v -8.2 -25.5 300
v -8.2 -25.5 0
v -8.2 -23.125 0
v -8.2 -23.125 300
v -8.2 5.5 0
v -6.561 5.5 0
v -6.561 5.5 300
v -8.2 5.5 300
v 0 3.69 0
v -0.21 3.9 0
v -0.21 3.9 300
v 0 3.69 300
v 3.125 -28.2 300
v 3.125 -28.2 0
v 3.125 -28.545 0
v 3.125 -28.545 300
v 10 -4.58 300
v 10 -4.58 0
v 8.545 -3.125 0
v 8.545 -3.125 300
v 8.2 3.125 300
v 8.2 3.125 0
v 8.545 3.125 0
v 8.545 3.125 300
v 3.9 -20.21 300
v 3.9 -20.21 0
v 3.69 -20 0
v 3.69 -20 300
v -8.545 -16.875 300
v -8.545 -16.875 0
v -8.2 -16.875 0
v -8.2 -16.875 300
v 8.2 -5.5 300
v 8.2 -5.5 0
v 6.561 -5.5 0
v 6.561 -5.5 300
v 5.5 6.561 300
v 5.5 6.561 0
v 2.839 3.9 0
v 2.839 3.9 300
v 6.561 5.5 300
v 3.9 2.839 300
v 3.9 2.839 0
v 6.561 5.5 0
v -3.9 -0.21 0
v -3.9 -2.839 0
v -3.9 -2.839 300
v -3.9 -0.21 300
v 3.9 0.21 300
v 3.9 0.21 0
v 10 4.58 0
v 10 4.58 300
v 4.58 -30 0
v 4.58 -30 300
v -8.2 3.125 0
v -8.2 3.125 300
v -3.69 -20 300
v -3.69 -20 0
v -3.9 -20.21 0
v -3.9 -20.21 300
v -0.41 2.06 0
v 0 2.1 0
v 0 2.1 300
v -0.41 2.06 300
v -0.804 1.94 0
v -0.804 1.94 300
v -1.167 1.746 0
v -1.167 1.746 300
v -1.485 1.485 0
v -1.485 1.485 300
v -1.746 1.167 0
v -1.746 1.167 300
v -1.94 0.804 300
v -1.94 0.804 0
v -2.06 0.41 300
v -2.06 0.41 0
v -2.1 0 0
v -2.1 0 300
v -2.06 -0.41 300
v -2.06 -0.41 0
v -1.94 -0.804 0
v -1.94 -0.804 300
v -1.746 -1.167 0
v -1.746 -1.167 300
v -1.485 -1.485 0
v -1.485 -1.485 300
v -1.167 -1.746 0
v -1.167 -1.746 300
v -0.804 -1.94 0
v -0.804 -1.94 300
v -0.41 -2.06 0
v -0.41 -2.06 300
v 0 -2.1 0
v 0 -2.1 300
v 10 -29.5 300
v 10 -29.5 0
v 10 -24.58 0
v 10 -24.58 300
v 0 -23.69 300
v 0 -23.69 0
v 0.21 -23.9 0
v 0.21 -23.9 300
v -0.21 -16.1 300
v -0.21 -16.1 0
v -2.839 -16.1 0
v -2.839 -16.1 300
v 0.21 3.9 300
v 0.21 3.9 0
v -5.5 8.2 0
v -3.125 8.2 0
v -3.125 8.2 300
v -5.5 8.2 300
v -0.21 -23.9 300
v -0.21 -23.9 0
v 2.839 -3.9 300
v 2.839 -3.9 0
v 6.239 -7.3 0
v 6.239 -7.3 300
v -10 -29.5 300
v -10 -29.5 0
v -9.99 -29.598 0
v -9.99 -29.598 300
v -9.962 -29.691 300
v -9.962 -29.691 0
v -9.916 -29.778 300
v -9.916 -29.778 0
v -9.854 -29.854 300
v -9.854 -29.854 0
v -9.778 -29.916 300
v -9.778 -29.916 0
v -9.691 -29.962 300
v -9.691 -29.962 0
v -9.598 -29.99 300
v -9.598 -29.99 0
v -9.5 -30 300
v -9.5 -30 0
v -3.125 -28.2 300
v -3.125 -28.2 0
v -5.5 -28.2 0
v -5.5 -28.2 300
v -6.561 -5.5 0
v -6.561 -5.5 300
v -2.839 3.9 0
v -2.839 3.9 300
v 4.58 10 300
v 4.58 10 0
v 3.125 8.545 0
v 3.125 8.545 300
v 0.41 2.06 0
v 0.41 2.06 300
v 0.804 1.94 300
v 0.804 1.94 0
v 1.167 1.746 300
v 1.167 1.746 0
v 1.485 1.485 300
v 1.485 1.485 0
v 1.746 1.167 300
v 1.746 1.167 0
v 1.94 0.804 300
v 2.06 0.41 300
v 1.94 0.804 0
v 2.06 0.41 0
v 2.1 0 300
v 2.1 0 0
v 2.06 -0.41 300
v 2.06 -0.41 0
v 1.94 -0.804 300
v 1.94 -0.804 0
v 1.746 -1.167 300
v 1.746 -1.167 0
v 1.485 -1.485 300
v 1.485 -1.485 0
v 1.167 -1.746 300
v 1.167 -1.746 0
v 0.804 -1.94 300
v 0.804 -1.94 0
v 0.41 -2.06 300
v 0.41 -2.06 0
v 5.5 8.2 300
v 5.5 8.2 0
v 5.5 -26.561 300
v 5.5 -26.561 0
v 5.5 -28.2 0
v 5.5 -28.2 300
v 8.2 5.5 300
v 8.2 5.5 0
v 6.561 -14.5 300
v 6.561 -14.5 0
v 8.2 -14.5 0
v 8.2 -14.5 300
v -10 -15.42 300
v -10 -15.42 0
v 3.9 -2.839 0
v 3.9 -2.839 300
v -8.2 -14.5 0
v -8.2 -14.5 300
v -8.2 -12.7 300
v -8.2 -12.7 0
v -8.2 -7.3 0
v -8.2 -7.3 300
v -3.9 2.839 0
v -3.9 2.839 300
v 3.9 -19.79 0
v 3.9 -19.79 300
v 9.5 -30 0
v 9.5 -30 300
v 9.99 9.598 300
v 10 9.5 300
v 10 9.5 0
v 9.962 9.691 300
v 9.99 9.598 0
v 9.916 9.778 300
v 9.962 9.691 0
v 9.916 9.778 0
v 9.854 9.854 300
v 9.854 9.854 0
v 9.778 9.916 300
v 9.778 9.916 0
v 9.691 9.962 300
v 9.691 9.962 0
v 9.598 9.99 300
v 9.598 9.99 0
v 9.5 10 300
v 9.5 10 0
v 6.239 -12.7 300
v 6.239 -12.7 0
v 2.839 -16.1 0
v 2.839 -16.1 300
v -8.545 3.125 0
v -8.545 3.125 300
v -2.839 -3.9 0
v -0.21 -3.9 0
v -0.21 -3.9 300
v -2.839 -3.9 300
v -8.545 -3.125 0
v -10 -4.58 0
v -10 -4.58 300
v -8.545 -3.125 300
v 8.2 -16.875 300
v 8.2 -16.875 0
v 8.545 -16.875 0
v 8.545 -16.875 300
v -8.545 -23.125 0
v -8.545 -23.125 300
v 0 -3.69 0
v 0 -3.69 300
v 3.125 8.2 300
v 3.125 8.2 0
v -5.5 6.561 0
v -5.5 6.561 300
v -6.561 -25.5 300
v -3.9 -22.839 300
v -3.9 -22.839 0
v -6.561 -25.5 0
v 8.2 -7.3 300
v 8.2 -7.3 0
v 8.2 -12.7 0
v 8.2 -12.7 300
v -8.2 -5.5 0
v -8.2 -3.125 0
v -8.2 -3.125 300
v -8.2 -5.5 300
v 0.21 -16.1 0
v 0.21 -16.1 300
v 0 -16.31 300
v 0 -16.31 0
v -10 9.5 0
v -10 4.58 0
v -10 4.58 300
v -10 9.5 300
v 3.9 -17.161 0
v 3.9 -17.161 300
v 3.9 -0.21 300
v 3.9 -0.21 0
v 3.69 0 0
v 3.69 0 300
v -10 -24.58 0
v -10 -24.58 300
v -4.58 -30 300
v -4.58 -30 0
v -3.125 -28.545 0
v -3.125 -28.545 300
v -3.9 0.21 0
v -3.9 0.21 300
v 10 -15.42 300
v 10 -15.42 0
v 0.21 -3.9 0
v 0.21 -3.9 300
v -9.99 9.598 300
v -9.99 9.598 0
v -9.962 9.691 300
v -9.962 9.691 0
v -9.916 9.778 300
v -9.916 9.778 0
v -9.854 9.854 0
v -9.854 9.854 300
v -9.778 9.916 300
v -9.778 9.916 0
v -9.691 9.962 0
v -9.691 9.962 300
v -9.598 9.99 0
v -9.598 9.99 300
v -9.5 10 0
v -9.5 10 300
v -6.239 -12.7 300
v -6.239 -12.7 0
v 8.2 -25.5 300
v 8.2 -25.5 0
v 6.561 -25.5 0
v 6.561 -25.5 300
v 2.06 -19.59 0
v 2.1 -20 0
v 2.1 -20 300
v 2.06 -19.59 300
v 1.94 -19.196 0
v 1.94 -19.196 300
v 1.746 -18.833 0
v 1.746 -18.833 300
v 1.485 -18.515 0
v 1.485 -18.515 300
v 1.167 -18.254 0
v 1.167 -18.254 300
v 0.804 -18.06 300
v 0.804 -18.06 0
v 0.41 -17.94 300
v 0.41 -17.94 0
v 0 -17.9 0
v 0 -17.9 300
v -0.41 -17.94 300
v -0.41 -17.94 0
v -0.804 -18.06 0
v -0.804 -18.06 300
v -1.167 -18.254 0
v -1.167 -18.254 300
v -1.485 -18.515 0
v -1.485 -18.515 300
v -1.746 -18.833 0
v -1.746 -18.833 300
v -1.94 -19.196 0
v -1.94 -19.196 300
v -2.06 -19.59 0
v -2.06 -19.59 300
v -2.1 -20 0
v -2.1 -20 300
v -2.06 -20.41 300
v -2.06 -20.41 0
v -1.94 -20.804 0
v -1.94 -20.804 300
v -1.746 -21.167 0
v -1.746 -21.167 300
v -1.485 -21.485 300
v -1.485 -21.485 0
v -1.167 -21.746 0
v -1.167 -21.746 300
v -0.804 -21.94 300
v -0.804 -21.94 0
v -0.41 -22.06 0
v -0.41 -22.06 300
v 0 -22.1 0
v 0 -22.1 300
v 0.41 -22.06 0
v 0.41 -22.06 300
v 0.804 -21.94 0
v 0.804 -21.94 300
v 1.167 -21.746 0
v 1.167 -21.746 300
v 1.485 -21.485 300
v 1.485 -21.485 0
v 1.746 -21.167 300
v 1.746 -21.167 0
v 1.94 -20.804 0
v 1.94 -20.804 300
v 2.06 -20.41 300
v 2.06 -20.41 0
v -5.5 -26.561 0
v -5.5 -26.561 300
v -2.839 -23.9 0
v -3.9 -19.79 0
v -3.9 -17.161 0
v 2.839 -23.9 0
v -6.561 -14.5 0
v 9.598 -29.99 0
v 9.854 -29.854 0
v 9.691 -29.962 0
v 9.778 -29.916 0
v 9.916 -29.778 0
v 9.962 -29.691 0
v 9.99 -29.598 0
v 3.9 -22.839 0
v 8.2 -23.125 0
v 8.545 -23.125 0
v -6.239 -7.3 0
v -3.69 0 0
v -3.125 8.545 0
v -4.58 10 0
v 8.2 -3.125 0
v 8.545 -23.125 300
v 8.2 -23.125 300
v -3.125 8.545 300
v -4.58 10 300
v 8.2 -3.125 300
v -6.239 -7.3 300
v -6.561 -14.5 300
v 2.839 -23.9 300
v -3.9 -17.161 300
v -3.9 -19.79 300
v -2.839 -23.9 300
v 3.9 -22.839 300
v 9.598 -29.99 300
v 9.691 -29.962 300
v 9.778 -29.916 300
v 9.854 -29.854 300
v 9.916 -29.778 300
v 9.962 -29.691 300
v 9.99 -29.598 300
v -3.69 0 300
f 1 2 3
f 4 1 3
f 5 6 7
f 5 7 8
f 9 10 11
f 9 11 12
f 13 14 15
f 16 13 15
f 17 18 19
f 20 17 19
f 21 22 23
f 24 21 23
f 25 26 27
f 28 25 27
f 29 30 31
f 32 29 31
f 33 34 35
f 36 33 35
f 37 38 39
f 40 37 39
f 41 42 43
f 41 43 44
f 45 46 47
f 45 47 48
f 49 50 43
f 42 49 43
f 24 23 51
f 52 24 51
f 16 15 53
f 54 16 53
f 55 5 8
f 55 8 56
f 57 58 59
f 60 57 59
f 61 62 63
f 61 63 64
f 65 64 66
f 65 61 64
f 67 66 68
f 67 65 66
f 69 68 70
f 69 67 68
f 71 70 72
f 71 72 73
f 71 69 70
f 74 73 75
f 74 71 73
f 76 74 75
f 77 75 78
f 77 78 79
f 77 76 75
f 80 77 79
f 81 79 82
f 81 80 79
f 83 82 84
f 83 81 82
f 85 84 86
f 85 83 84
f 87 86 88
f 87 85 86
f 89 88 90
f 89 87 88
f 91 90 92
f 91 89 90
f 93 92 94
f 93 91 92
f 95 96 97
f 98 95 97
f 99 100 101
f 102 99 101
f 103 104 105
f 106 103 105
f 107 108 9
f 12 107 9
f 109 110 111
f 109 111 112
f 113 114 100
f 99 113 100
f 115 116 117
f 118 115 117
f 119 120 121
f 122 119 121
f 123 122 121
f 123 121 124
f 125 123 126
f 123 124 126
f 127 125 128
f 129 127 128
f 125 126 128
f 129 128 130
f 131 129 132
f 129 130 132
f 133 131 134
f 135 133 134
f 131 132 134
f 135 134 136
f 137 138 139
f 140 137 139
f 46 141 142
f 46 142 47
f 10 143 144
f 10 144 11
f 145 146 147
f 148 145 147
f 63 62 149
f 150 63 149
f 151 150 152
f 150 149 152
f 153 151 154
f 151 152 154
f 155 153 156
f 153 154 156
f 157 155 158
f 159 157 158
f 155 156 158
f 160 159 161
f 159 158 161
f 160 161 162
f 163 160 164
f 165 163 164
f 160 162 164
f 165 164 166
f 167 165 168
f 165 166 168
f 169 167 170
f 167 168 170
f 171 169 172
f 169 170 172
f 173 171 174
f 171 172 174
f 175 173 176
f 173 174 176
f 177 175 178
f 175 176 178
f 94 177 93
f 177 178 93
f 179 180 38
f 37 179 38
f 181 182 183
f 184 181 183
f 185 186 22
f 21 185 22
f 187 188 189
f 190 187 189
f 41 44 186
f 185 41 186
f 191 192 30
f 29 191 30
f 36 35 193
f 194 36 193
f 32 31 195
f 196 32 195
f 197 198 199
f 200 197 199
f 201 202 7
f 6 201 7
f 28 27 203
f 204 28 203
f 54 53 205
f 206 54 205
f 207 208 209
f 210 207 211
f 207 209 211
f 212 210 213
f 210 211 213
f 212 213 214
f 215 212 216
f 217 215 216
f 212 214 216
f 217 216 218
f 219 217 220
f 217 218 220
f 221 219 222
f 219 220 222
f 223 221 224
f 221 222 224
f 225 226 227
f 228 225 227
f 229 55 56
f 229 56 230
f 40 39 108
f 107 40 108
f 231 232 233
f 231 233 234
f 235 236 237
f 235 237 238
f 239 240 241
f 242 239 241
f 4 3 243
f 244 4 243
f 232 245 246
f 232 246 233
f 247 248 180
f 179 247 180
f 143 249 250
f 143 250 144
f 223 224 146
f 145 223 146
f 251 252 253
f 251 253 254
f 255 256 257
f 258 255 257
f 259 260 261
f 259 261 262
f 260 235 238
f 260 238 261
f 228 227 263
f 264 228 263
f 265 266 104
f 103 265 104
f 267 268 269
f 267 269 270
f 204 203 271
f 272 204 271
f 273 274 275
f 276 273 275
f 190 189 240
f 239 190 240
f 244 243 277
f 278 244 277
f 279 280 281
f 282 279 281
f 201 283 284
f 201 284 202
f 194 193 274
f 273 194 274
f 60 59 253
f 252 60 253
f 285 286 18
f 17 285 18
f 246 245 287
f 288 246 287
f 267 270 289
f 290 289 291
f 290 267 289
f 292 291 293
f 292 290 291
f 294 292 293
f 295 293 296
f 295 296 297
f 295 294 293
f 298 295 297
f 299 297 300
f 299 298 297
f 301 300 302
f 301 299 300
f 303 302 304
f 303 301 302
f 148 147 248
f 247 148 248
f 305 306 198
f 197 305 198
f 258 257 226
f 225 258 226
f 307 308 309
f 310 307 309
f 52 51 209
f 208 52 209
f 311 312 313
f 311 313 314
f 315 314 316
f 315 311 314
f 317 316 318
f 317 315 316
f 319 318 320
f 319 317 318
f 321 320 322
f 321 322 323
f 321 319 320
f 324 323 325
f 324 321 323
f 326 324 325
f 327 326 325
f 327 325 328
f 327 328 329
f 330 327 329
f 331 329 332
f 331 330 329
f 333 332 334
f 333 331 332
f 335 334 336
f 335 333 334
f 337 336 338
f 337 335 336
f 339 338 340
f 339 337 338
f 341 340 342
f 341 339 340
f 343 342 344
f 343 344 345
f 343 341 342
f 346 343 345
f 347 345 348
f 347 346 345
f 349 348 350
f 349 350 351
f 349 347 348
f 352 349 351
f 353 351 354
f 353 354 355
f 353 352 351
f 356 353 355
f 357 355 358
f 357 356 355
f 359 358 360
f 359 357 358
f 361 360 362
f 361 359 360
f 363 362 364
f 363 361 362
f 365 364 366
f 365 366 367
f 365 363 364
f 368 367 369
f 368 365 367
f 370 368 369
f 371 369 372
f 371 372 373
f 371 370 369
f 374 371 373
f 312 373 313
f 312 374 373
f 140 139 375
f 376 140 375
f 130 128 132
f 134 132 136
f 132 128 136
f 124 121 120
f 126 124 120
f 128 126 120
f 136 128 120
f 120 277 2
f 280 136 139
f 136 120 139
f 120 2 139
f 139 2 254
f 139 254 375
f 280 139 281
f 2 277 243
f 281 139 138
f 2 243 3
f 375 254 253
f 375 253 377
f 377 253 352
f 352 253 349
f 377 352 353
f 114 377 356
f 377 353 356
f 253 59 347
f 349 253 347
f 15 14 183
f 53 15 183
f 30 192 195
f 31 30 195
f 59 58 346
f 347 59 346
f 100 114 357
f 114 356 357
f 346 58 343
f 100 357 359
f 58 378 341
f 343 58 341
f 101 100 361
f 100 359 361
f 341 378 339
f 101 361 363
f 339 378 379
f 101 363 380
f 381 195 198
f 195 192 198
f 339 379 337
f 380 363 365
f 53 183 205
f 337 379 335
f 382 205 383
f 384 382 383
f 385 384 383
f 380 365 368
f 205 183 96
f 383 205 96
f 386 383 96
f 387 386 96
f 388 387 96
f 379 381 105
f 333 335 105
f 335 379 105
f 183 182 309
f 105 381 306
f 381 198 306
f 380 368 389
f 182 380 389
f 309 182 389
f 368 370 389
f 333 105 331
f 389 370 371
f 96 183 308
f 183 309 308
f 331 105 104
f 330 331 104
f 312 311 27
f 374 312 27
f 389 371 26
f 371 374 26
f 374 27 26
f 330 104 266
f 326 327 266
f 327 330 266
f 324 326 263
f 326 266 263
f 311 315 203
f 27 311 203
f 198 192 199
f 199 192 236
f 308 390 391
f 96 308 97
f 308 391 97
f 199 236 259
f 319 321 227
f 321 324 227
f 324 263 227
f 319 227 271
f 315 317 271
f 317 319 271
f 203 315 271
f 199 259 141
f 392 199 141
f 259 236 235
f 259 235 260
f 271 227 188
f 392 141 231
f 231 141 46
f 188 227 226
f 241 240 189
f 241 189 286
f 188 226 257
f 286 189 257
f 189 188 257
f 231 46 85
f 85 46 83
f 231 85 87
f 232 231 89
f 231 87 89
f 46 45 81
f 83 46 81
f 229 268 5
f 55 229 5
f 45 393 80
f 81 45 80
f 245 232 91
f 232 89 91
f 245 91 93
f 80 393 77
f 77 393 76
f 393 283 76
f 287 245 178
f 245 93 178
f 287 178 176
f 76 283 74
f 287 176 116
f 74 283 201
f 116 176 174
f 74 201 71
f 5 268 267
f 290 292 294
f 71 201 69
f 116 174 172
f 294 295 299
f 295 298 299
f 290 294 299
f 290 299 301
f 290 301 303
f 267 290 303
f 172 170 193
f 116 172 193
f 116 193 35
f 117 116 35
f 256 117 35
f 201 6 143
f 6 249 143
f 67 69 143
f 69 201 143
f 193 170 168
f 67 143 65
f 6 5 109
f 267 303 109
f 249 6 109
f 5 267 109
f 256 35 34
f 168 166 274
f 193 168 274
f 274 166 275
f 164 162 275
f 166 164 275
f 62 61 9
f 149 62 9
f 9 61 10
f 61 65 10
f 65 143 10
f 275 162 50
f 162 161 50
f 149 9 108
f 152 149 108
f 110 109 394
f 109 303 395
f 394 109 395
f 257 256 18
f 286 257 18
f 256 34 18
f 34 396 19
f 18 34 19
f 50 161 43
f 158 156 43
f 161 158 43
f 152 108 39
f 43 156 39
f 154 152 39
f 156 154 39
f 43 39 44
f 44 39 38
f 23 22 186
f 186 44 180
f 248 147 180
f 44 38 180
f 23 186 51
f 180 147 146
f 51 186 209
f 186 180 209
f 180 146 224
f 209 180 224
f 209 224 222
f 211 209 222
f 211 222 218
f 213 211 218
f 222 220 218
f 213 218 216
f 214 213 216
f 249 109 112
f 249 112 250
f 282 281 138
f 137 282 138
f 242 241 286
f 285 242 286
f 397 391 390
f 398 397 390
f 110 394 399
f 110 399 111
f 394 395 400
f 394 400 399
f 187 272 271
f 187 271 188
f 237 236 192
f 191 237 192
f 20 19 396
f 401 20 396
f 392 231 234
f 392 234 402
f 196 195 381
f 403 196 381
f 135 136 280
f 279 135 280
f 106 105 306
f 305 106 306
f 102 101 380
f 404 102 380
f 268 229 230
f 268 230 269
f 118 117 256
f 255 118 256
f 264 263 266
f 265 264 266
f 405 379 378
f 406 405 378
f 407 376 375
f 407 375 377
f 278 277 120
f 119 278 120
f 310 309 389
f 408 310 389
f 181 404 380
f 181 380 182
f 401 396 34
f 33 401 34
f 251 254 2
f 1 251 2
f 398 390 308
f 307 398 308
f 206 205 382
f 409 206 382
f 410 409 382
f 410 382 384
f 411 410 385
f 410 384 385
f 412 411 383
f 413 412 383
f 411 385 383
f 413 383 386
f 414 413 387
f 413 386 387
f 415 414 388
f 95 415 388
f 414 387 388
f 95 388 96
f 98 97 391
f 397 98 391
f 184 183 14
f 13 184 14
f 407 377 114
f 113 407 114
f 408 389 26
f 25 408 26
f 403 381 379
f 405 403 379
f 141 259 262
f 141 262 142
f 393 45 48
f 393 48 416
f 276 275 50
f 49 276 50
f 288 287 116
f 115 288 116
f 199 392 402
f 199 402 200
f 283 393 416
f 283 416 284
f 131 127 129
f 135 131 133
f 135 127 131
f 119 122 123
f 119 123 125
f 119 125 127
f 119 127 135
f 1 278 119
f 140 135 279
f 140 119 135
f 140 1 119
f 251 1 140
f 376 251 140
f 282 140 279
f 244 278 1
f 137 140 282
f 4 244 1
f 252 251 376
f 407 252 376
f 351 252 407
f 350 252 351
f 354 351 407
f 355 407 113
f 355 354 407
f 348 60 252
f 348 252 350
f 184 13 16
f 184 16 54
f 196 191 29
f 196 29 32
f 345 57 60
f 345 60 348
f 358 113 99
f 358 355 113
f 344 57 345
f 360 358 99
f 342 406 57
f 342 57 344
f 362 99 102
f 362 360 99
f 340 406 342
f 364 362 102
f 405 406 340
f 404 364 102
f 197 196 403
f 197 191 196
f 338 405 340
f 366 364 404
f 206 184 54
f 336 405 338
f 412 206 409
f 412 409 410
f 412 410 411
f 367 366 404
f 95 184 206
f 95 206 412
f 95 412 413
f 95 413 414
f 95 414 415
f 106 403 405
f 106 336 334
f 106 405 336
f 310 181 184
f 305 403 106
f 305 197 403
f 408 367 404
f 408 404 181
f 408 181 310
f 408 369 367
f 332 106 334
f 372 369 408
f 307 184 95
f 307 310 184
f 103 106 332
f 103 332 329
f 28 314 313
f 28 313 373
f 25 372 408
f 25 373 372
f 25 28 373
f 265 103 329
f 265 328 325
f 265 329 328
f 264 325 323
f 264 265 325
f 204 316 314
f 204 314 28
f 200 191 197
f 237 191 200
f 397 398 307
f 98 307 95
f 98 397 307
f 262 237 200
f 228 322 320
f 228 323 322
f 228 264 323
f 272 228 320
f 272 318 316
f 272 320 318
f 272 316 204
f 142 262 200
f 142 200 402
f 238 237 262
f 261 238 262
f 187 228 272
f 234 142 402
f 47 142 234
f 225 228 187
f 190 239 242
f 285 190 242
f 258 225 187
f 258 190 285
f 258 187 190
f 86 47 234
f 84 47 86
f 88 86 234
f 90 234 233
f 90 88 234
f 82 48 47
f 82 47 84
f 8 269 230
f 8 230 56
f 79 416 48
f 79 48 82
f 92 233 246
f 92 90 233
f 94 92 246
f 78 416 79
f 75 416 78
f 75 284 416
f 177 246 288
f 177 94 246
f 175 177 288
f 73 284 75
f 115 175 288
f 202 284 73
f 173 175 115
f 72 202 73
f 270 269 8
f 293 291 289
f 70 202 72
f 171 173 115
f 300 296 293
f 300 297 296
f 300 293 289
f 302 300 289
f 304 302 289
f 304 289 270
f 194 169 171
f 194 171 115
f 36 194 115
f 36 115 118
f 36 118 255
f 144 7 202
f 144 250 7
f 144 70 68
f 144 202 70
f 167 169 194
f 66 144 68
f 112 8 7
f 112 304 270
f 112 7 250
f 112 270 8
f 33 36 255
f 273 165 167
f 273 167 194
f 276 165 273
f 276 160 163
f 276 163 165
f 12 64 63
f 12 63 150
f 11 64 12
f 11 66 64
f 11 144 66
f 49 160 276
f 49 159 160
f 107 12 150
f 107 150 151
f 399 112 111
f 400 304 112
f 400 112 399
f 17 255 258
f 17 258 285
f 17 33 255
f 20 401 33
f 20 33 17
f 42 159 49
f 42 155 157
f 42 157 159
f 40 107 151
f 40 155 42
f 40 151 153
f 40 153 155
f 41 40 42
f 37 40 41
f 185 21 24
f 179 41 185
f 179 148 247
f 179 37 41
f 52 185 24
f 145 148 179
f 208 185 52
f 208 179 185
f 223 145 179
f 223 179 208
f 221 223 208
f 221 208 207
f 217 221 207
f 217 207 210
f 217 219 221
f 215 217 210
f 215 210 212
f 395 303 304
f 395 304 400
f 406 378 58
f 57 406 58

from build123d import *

# Parameters (mm, degrees)
BOSS_EXTRU_1_DEPTH  = 300
SYM_TRIE6_OUTLINE_R = 2.1
SYM_TRIE6_DEPTH     = 300


# Read off the part's stored shape, not the designer's step: Symétrie6
with BuildPart() as part:
    # Esquisse1 → Boss.-Extru.1 (new body)
    with BuildSketch(Plane.XY):
        with BuildLine():
            Line((-9.5, 10), (-4.58, 10))
            Line((-4.58, 10), (-3.125, 8.545))
            Line((-3.125, 8.545), (-3.125, 8.2))
            Line((-3.125, 8.2), (-5.5, 8.2))
            Line((-5.5, 8.2), (-5.5, 6.560660172))
            Line((-5.5, 6.560660172), (-2.839339828, 3.9))
            Line((-2.839339828, 3.9), (-0.21, 3.9))
            Line((-0.21, 3.9), (0, 3.69))
            Line((0, 3.69), (0, 2.1))
            ThreePointArc((0, 2.1), (-2.1, 0), (0, -2.1))
            Line((0, -2.1), (0, -3.69))
            Line((0, -3.69), (-0.21, -3.9))
            Line((-0.21, -3.9), (-2.839339828, -3.9))
            Line((-2.839339828, -3.9), (-6.239339828, -7.3))
            Line((-6.239339828, -7.3), (-8.2, -7.3))
            Line((-8.2, -7.3), (-8.2, -10))
            Line((-8.2, -10), (-10, -10))
            Line((-10, -10), (-10, -4.58))
            Line((-10, -4.58), (-8.545, -3.125))
            Line((-8.545, -3.125), (-8.2, -3.125))
            Line((-8.2, -3.125), (-8.2, -5.5))
            Line((-8.2, -5.5), (-6.560660172, -5.5))
            Line((-6.560660172, -5.5), (-3.9, -2.839339828))
            Line((-3.9, -2.839339828), (-3.9, -0.21))
            Line((-3.9, -0.21), (-3.69, 0))
            Line((-3.69, 0), (-3.9, 0.21))
            Line((-3.9, 0.21), (-3.9, 2.839339828))
            Line((-3.9, 2.839339828), (-6.560660172, 5.5))
            Line((-6.560660172, 5.5), (-8.2, 5.5))
            Line((-8.2, 5.5), (-8.2, 3.125))
            Line((-8.2, 3.125), (-8.545, 3.125))
            Line((-8.545, 3.125), (-10, 4.58))
            Line((-10, 4.58), (-10, 9.5))
            ThreePointArc((-10, 9.5), (-9.853553391, 9.853553391), (-9.5, 10))
        make_face()
    boss_extru_1 = extrude(amount=BOSS_EXTRU_1_DEPTH)

    # Symétrie1: Boss.-Extru.1 across Right Plane
    add(boss_extru_1.mirror(Plane(origin=(0, 0, 0), x_dir=(0, 0, -1), z_dir=(1, 0, 0))))

    # Symétrie6 outline → Symétrie6 (add)
    with BuildSketch(Plane.XY):
        with BuildLine():
            Line((-3.9, -17.160660172), (-3.9, -19.79))
            Line((-3.9, -19.79), (-3.69, -20))
            Line((-3.69, -20), (-3.9, -20.21))
            Line((-3.9, -20.21), (-3.9, -22.839339828))
            Line((-3.9, -22.839339828), (-6.560660172, -25.5))
            Line((-6.560660172, -25.5), (-8.2, -25.5))
            Line((-8.2, -25.5), (-8.2, -23.125))
            Line((-8.2, -23.125), (-8.545, -23.125))
            Line((-8.545, -23.125), (-10, -24.58))
            Line((-10, -24.58), (-10, -29.5))
            ThreePointArc((-10, -29.5), (-9.853553391, -29.853553391), (-9.5, -30))
            Line((-9.5, -30), (-4.58, -30))
            Line((-4.58, -30), (-3.125, -28.545))
            Line((-3.125, -28.545), (-3.125, -28.2))
            Line((-3.125, -28.2), (-5.5, -28.2))
            Line((-5.5, -28.2), (-5.5, -26.560660172))
            Line((-5.5, -26.560660172), (-2.839339828, -23.9))
            Line((-2.839339828, -23.9), (-0.21, -23.9))
            Line((-0.21, -23.9), (0, -23.69))
            Line((0, -23.69), (0.21, -23.9))
            Line((0.21, -23.9), (2.839339828, -23.9))
            Line((2.839339828, -23.9), (5.5, -26.560660172))
            Line((5.5, -26.560660172), (5.5, -28.2))
            Line((5.5, -28.2), (3.125, -28.2))
            Line((3.125, -28.2), (3.125, -28.545))
            Line((3.125, -28.545), (4.58, -30))
            Line((4.58, -30), (9.5, -30))
            ThreePointArc((9.5, -30), (9.853553391, -29.853553391), (10, -29.5))
            Line((10, -29.5), (10, -24.58))
            Line((10, -24.58), (8.545, -23.125))
            Line((8.545, -23.125), (8.2, -23.125))
            Line((8.2, -23.125), (8.2, -25.5))
            Line((8.2, -25.5), (6.560660172, -25.5))
            Line((6.560660172, -25.5), (3.9, -22.839339828))
            Line((3.9, -22.839339828), (3.9, -20.21))
            Line((3.9, -20.21), (3.69, -20))
            Line((3.69, -20), (3.9, -19.79))
            Line((3.9, -19.79), (3.9, -17.160660172))
            Line((3.9, -17.160660172), (6.560660172, -14.5))
            Line((6.560660172, -14.5), (8.2, -14.5))
            Line((8.2, -14.5), (8.2, -16.875))
            Line((8.2, -16.875), (8.545, -16.875))
            Line((8.545, -16.875), (10, -15.42))
            Line((10, -15.42), (10, -10))
            Line((10, -10), (8.2, -10))
            Line((8.2, -10), (8.2, -12.7))
            Line((8.2, -12.7), (6.239339828, -12.7))
            Line((6.239339828, -12.7), (2.839339828, -16.1))
            Line((2.839339828, -16.1), (0.21, -16.1))
            Line((0.21, -16.1), (0, -16.31))
            Line((0, -16.31), (-0.21, -16.1))
            Line((-0.21, -16.1), (-2.839339828, -16.1))
            Line((-2.839339828, -16.1), (-6.239339828, -12.7))
            Line((-6.239339828, -12.7), (-8.2, -12.7))
            Line((-8.2, -12.7), (-8.2, -10))
            Line((-8.2, -10), (-10, -10))
            Line((-10, -10), (-10, -15.42))
            Line((-10, -15.42), (-8.545, -16.875))
            Line((-8.545, -16.875), (-8.2, -16.875))
            Line((-8.2, -16.875), (-8.2, -14.5))
            Line((-8.2, -14.5), (-6.560660172, -14.5))
            Line((-6.560660172, -14.5), (-3.9, -17.160660172))
        make_face()
        with Locations((0, -20)):
            Circle(SYM_TRIE6_OUTLINE_R, mode=Mode.SUBTRACT)
    extrude(amount=SYM_TRIE6_DEPTH)


solid = part.part
